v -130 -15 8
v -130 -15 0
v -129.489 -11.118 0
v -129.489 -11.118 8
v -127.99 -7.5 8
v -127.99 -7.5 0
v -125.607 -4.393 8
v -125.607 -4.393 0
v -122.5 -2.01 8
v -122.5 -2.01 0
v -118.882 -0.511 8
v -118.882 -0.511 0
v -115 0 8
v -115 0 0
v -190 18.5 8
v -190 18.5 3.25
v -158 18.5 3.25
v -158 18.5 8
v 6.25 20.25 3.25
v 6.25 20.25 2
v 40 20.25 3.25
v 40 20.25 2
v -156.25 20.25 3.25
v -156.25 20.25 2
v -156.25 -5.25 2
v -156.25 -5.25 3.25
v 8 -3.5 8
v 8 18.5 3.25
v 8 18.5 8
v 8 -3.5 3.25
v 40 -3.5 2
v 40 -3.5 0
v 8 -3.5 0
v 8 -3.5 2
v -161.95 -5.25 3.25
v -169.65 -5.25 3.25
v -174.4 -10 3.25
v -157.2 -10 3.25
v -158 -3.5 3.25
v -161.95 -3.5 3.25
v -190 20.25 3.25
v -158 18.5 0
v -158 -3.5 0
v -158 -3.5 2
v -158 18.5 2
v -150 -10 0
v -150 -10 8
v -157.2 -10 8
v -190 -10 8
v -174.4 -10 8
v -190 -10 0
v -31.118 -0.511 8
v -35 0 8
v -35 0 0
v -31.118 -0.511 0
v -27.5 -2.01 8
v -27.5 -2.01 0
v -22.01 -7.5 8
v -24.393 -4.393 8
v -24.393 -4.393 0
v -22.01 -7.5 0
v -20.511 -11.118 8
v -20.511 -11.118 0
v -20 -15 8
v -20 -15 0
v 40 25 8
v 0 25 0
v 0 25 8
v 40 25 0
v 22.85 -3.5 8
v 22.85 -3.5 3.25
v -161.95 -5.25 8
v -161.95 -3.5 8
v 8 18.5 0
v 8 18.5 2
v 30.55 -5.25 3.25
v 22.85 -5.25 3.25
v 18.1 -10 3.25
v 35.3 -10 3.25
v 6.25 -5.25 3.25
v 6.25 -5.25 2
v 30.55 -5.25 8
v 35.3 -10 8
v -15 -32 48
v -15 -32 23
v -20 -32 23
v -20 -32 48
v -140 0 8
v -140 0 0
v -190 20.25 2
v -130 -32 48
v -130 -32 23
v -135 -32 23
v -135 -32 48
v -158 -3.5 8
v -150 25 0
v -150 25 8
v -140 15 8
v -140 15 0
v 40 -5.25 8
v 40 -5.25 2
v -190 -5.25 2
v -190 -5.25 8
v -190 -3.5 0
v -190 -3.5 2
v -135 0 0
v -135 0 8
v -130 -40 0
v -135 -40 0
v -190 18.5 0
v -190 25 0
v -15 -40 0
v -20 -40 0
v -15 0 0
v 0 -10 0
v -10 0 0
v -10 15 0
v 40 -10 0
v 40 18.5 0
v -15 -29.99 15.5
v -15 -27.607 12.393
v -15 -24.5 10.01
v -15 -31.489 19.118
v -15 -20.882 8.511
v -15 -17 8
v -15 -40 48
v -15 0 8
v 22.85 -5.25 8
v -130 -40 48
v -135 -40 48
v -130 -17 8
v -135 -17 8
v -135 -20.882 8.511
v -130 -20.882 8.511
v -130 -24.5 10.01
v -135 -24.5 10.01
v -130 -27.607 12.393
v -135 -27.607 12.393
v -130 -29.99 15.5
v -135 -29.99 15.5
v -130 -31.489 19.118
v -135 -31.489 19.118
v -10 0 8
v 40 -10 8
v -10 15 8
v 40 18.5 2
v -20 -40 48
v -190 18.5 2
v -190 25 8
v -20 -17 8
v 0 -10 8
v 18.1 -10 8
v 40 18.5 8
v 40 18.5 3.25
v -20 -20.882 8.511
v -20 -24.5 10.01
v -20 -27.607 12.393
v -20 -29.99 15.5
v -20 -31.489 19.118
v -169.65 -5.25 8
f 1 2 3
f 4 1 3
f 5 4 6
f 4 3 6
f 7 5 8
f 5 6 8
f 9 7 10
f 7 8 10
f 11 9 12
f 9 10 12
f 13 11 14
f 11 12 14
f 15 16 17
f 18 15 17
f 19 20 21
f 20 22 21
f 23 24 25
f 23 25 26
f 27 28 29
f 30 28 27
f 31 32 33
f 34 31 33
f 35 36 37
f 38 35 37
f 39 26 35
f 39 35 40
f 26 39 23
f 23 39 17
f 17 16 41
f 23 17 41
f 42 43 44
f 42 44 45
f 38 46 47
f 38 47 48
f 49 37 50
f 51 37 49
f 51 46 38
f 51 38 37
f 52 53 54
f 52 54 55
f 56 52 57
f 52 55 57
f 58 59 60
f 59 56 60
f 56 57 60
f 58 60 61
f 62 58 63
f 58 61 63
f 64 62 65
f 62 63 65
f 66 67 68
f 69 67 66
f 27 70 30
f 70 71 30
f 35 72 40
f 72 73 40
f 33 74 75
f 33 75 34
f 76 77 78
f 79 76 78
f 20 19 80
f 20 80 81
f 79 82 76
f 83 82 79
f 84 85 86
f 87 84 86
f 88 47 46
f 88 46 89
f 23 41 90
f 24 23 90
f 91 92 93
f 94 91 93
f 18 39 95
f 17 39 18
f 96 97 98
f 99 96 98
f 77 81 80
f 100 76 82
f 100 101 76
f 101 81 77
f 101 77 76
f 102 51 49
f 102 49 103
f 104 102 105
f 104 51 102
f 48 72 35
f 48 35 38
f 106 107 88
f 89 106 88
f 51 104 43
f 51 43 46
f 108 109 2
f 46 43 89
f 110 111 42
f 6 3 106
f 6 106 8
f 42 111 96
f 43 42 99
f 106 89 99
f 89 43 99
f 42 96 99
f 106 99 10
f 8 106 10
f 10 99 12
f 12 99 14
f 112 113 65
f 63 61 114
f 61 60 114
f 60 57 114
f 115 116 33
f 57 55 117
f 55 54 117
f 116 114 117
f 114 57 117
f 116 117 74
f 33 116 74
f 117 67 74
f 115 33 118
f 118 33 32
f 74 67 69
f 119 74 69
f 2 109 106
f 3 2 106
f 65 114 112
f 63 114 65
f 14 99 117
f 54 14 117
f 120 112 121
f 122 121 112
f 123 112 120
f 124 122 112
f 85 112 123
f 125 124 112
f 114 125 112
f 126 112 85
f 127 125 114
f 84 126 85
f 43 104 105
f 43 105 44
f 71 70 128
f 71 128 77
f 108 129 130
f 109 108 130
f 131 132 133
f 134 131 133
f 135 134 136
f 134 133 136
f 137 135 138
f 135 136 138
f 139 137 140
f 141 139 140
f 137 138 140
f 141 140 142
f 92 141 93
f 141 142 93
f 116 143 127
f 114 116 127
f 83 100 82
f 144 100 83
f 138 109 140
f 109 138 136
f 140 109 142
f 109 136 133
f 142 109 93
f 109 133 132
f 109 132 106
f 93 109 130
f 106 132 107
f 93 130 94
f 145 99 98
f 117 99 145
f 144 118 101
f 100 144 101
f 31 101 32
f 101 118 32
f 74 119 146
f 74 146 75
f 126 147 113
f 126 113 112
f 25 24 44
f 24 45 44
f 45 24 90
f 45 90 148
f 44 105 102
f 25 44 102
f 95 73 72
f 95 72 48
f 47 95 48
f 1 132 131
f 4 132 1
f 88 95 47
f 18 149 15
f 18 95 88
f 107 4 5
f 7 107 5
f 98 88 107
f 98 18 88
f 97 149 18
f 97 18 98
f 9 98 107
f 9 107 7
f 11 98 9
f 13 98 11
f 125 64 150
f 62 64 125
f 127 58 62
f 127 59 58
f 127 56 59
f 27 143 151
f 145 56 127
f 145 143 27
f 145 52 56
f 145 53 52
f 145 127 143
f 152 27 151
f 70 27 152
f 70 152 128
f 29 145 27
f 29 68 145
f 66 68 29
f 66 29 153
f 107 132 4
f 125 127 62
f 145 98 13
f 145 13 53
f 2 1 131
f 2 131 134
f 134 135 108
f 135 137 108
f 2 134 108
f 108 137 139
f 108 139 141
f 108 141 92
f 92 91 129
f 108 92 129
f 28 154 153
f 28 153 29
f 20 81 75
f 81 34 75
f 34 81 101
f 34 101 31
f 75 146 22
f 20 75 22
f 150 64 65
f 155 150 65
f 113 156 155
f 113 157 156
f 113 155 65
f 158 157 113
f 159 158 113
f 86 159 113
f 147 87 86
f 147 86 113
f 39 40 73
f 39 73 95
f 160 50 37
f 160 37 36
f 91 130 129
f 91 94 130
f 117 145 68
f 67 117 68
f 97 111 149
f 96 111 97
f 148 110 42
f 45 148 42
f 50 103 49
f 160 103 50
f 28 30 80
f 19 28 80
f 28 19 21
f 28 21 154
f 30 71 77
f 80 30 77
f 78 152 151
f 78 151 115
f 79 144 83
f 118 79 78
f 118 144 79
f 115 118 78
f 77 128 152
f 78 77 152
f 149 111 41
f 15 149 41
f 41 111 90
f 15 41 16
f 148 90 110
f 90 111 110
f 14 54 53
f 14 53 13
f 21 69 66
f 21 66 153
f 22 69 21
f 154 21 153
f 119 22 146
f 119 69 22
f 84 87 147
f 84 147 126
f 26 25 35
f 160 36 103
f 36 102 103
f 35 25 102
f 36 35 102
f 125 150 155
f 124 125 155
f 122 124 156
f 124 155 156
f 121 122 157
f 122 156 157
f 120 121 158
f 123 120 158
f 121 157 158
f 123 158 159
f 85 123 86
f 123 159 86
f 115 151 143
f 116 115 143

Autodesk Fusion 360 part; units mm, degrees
sketch "Sketch1" plane through (0, 0, 0) normal (0, 0, 1) x (1, 0, 0)
  line L0 (0, 0) -> (-150, 0)
  line L1 (-150, 0) -> (-150, 15)
  line L2 (-150, 15) -> (0, 15)
  line L3 (0, 15) -> (0, 0)
  line L4 (-150, -10) -> (-158, -10)
  line L5 (-158, -10) -> (-158, 25)
  line L6 (-158, 25) -> (-150, 25)
  line L7 (-150, 25) -> (-150, -10)
  line L8 (-158, -5) -> (-188, -5)
  line L9 (-188, -5) -> (-188, 20)
  line L10 (-188, 20) -> (-158, 20)
  line L11 (-158, 20) -> (-158, -5)
  line L12 (-158, -10) -> (-190, -10)
  line L13 (-190, -10) -> (-190, -3.5)
  line L14 (-190, -3.5) -> (-158, -3.5)
  line L15 (-158, -3.5) -> (-158, -10)
  line L16 (-158, 25) -> (-190, 25)
  line L17 (-190, 25) -> (-190, 18.5)
  line L18 (-190, 18.5) -> (-158, 18.5)
  line L19 (-158, 18.5) -> (-158, 25)
  line L20 (0, 25) -> (8, 25)
  line L21 (8, 25) -> (8, -10)
  line L22 (8, -10) -> (0, -10)
  line L23 (0, -10) -> (0, 25)
  line L24 (8, 25) -> (40, 25)
  line L25 (40, 25) -> (40, 18.5)
  line L26 (40, 18.5) -> (8, 18.5)
  line L27 (8, 18.5) -> (8, 25)
  line L28 (8, -10) -> (40, -10)
  line L29 (40, -10) -> (40, -3.5)
  line L30 (40, -3.5) -> (8, -3.5)
  line L31 (8, -3.5) -> (8, -10)
  dimension "d1" = 150
  dimension "d2" = 15
  dimension "d3" = 8
  dimension "d4" = 35
  dimension "d5" = 10
  dimension "d6" = 30
  dimension "d7" = 25
  dimension "d8" = 5
  dimension "d9" = 6.5
  dimension "d10" = 32
  dimension "d11" = 32
  dimension "d12" = 6.5
  dimension "d13" = 8
  dimension "d14" = 35
  dimension "d15" = 10
  dimension "d16" = 32
  dimension "d17" = 6.5
  dimension "d18" = 32
  dimension "d19" = 6.5
extrude "Extrude1" add sketch "Sketch1" along normal blind 8 contours L0 L1 L2 L3 L7 L23 | L3 L20 L21 L22 L23 L27 L31 | L1 L4 L5 L6 L7 L11 L15 L19 | L21 L28 L29 L30 L31 | L5 L8 L9 L12 L13 L14 L15 | L21 L24 L25 L26 L27 | L5 L9 L10 L16 L17 L18 L19 | L5 L8 L9 L11 L14 L15 | L5 L9 L10 L11 L18 L19
sketch "Sketch2" plane through (-190, 0, 0) normal (-1, 0, 0) x (0, 0, 1)
  line L0 (0, -3.5) -> (0, -10)
  line L1 (0, -10) -> (8, -10)
  line L2 (8, -10) -> (8, -3.5)
  line L3 (8, -3.5) -> (0, -3.5)
  line L4 (2, -3.5) -> (3.25, -3.5)
  line L5 (3.25, -3.5) -> (3.25, -5.25)
  line L6 (3.25, -5.25) -> (2, -5.25)
  line L7 (2, -5.25) -> (2, -3.5)
  line L8 (2, 18.5) -> (3.25, 18.5)
  line L9 (3.25, 18.5) -> (3.25, 20.25)
  line L10 (3.25, 20.25) -> (2, 20.25)
  line L11 (2, 20.25) -> (2, 18.5)
  dimension "d22" = 1.25
  dimension "d23" = 1.75
  dimension "d24" = 1.25
  dimension "d25" = 1.75
  dimension "d26" = 22
  dimension "d27" = 2
extrude "Extrude2" cut sketch "Sketch2" against normal blind 32 contours L3 L4 L5 L6 L7 | L8 L9 L10 L11
sketch "Sketch3" plane through (-158, 0, 0) normal (-1, 0, 0) x (0, 0, 1)
  line L0 (0, 18.5) -> (0, -3.5)
  line L1 (0, -3.5) -> (2, -3.5)
  line L2 (2, -3.5) -> (2, -5.25)
  line L3 (2, -5.25) -> (3.25, -5.25)
  line L4 (3.25, -5.25) -> (3.25, -3.5)
  line L5 (3.25, -3.5) -> (8, -3.5)
  line L6 (8, -3.5) -> (8, 18.5)
  line L7 (8, 18.5) -> (3.25, 18.5)
  line L8 (3.25, 18.5) -> (3.25, 20.25)
  line L9 (3.25, 20.25) -> (2, 20.25)
  line L10 (2, 20.25) -> (2, 18.5)
  line L11 (2, 18.5) -> (0, 18.5)
  line L12 (2, -5.25) -> (3.25, -5.25)
  line L13 (3.25, -5.25) -> (3.25, 20.25)
  line L14 (3.25, 20.25) -> (2, 20.25)
  line L15 (2, 20.25) -> (2, -5.25)
extrude "Extrude3" cut sketch "Sketch3" against normal blind 1.5 contours L2 L3 L4 L8 L9 L10 L12 L13 L14 L15
sketch "Sketch4" plane through (40, 0, 0) normal (1, 0, 0) x (0, 0, -1)
  line L0 (0, -10) -> (0, -3.5)
  line L1 (0, -3.5) -> (-8, -3.5)
  line L2 (-8, -3.5) -> (-8, -10)
  line L3 (-8, -10) -> (0, -10)
  line L4 (-2, -3.5) -> (-3.25, -3.5)
  line L5 (-3.25, -3.5) -> (-3.25, -5.25)
  line L6 (-3.25, -5.25) -> (-2, -5.25)
  line L7 (-2, -5.25) -> (-2, -3.5)
  line L8 (-3.25, 18.5) -> (-2, 18.5)
  line L9 (-2, 18.5) -> (-2, 20.25)
  line L10 (-2, 20.25) -> (-3.25, 20.25)
  line L11 (-3.25, 20.25) -> (-3.25, 18.5)
  line L12 (-2, -5.25) -> (-2, 20.25)
  dimension "d32" = 1.25
  dimension "d33" = 1.75
  dimension "d34" = 2
  dimension "d35" = 1.25
  dimension "d36" = 1.75
  dimension "d37" = 22
extrude "Extrude4" cut sketch "Sketch4" against normal blind 32 contours L8 L9 L10 L11 L12 | L1 L4 L5 L6 L7 L12
sketch "Sketch5" plane through (8, 0, 0) normal (1, 0, 0) x (0, 0, -1)
  line L0 (0, -3.5) -> (0, 18.5)
  line L1 (0, 18.5) -> (-2, 18.5)
  line L2 (-2, 18.5) -> (-2, 20.25)
  line L3 (-2, 20.25) -> (-3.25, 20.25)
  line L4 (-3.25, 20.25) -> (-3.25, 18.5)
  line L5 (-3.25, 18.5) -> (-8, 18.5)
  line L6 (-8, 18.5) -> (-8, -3.5)
  line L7 (-8, -3.5) -> (-3.25, -3.5)
  line L8 (-3.25, -3.5) -> (-3.25, -5.25)
  line L9 (-3.25, -5.25) -> (-2, -5.25)
  line L10 (-2, -5.25) -> (-2, -3.5)
  line L11 (-2, -3.5) -> (0, -3.5)
  line L12 (-3.25, 20.25) -> (-2, 20.25)
  line L13 (-2, 20.25) -> (-2, -5.25)
  line L14 (-2, -5.25) -> (-3.25, -5.25)
  line L15 (-3.25, -5.25) -> (-3.25, 20.25)
extrude "Extrude5" cut sketch "Sketch5" against normal blind 1.75 contours L2 L3 L4 L8 L9 L10 L12 L13 L14 L15
extrude "Extrude6" cut 1 faces at (-156.5, 11.75, 2.4167) along direction (1, 0, 0) blind 0.25
sketch "Sketch6" plane through (-190, 0, 0) normal (-1, 0, 0) x (0, 0, 1)
  line L0 (2, -5.25) -> (2, -3.5)
  line L1 (2, -3.5) -> (0, -3.5)
  line L2 (0, -3.5) -> (0, -10)
  line L3 (0, -10) -> (8, -10)
  line L4 (8, -10) -> (8, -3.5)
  line L5 (8, -3.5) -> (3.25, -3.5)
  line L6 (3.25, -3.5) -> (3.25, -5.25)
  line L7 (3.25, -5.25) -> (2, -5.25)
  line L8 (3.25, -5.25) -> (8, -5.25)
  line L9 (8, -5.25) -> (8, -3.5)
  line L10 (8, -3.5) -> (3.25, -3.5)
  line L11 (3.25, -3.5) -> (3.25, -5.25)
extrude "Extrude7" cut sketch "Sketch6" against normal blind 27.85 contours L4 L5 L6 L8 L9 L10 L11
sketch "Sketch7" plane through (40, 0, 0) normal (1, 0, 0) x (0, 0, -1)
  line L0 (-2, -3.5) -> (-2, -5.25)
  line L1 (-2, -5.25) -> (-3.25, -5.25)
  line L2 (-3.25, -5.25) -> (-3.25, -3.5)
  line L3 (-3.25, -3.5) -> (-8, -3.5)
  line L4 (-8, -3.5) -> (-8, -10)
  line L5 (-8, -10) -> (0, -10)
  line L6 (0, -10) -> (0, -3.5)
  line L7 (0, -3.5) -> (-2, -3.5)
  line L8 (-3.25, -5.25) -> (-8, -5.25)
  line L9 (-8, -5.25) -> (-8, -3.5)
  line L10 (-8, -3.5) -> (-3.25, -3.5)
  line L11 (-3.25, -3.5) -> (-3.25, -5.25)
extrude "Extrude8" cut sketch "Sketch7" against normal blind 13.2 contours L2 L3 L4 L8 L9 L10 L11
extrude "Extrude9" cut 1 faces at (26.8, -4.6667, 4.8333) along direction (-1, 0, 0) blind 0.1
extrude "Extrude10" cut 1 faces at (26.7, -4.6667, 4.8333) along direction (-1, 0, 0) blind 0.1
extrude "Extrude11" cut 1 faces at (-162.15, -4.0833, 4.8333) along direction (1, 0, 0) blind 0.1
sketch "Sketch8" plane through (0, -5.25, 0) normal (0, 1, 0) x (-1, 0, 0)
  line L0 (-40, 8) -> (-40, 2)
  line L1 (-40, 2) -> (-6.25, 2)
  line L2 (-6.25, 2) -> (-6.25, 3.25)
  line L3 (-6.25, 3.25) -> (-26.6, 3.25)
  line L4 (-26.6, 3.25) -> (-26.6, 8)
  line L5 (-26.6, 8) -> (-40, 8)
  line L6 (-26.6, 3.25) -> (-34.1, 3.25)
  line L7 (-34.1, 3.25) -> (-34.1, 8)
  line L8 (-34.1, 8) -> (-26.6, 8)
  line L9 (-26.6, 8) -> (-26.6, 3.25)
  dimension "d54" = 7.5
extrude "Extrude12" cut sketch "Sketch8" against normal blind 9 contours L4 L5 L6 L7 L8 L9
sketch "Sketch9" plane through (0, -5.25, 0) normal (0, 1, 0) x (-1, 0, 0)
  line L0 (190, 2) -> (190, 8)
  line L1 (190, 8) -> (162.05, 8)
  line L2 (162.05, 8) -> (162.05, 3.25)
  line L3 (162.05, 3.25) -> (156.25, 3.25)
  line L4 (156.25, 3.25) -> (156.25, 2)
  line L5 (156.25, 2) -> (190, 2)
  line L6 (162.05, 3.25) -> (169.55, 3.25)
  line L7 (169.55, 3.25) -> (169.55, 8)
  line L8 (169.55, 8) -> (162.05, 8)
  line L9 (162.05, 8) -> (162.05, 3.25)
  dimension "d57" = 7.5
extrude "Extrude13" cut sketch "Sketch9" against normal blind 6 contours L1 L2 L6 L7 L8 L9
extrude "Extrude18" cut 1 faces at (26.6, -6.25, 6.4167) along direction (-1, 0, 0) blind 2
extrude "Extrude19" add 1 faces at (34.1, -6.8333, 4.8333) along direction (-1, 0, 0) blind 2
extrude "Extrude20" cut 1 faces at (24.6, -6.25, 6.4167) along direction (-1, 0, 0) blind 1.75
extrude "Extrude21" add 1 faces at (32.1, -6.8333, 4.8333) along direction (-1, 0, 0) blind 1.75
extrude "Extrude22" cut 1 faces at (30.35, -6.8333, 4.8333) along direction (1, 0, 0) blind 0.2
extrude "Extrude23" cut 1 faces at (-169.55, -6.8333, 4.8333) along direction (-1, 0, 0) blind 0.1
extrude "Extrude24" cut 1 faces at (-162.05, -6.25, 6.4167) along direction (1, 0, 0) blind 0.1
sketch "Sketch14" plane through (0, 0, 8) normal (0, 0, 1) x (1, 0, 0)
  line L0 (-161.95, -3.5) -> (-161.95, -10)
  line L1 (-161.95, -10) -> (-150, -10)
  line L2 (-150, -10) -> (-150, 0)
  line L3 (-150, 0) -> (0, 0)
  line L4 (0, 0) -> (0, -10)
  line L5 (0, -10) -> (22.85, -10)
  line L6 (22.85, -10) -> (22.85, -3.5)
  line L7 (22.85, -3.5) -> (8, -3.5)
  line L8 (8, -3.5) -> (8, 18.5)
  line L9 (8, 18.5) -> (40, 18.5)
  line L10 (40, 18.5) -> (40, 25)
  line L11 (40, 25) -> (0, 25)
  line L12 (0, 25) -> (0, 15)
  line L13 (0, 15) -> (-150, 15)
  line L14 (-150, 15) -> (-150, 25)
  line L15 (-150, 25) -> (-190, 25)
  line L16 (-190, 25) -> (-190, 18.5)
  line L17 (-190, 18.5) -> (-158, 18.5)
  line L18 (-158, 18.5) -> (-158, -3.5)
  line L19 (-158, -3.5) -> (-161.95, -3.5)
  line L20 (22.85, -5.25) -> (22.85, -10)
  line L21 (22.85, -10) -> (18.1, -10)
  line L22 (22.85, -5.25) -> (18.1, -10)
  dimension "d89" = 4.75
  dimension "d90" = 4.75
extrude "Extrude25" cut sketch "Sketch14" against normal blind 4.75 contours L5 L6 L20 L21 L22
sketch "Sketch15" plane through (0, 0, 8) normal (0, 0, 1) x (1, 0, 0)
  line L0 (30.55, -5.25) -> (30.55, -10)
  line L1 (30.55, -10) -> (40, -10)
  line L2 (40, -10) -> (40, -5.25)
  line L3 (40, -5.25) -> (30.55, -5.25)
  line L4 (30.55, -5.25) -> (30.55, -10)
  line L5 (30.55, -10) -> (35.3, -10)
  line L6 (30.55, -5.25) -> (35.3, -10)
  dimension "d93" = 4.75
extrude "Extrude26" cut sketch "Sketch15" against normal blind 4.75 contours L0 L1 L4 L5 L6
sketch "Sketch16" plane through (0, 0, 8) normal (0, 0, 1) x (1, 0, 0)
  line L0 (-169.65, -10) -> (-169.65, -5.25)
  line L1 (-169.65, -5.25) -> (-190, -5.25)
  line L2 (-190, -5.25) -> (-190, -10)
  line L3 (-190, -10) -> (-169.65, -10)
  line L4 (-169.65, -5.25) -> (-169.65, -10)
  line L5 (-169.65, -10) -> (-174.4, -10)
  line L6 (-174.4, -10) -> (-169.65, -5.25)
  dimension "d60" = 4.75
  dimension "d61" = 4.75
  dimension "d96" = 4.75
extrude "Extrude27" cut sketch "Sketch16" against normal blind 4.75 contours L0 L3 L4 L5 L6
sketch "Sketch17" plane through (0, 0, 8) normal (0, 0, 1) x (1, 0, 0)
  line L0 (18.1, -10) -> (22.85, -5.25)
  line L1 (22.85, -5.25) -> (22.85, -3.5)
  line L2 (22.85, -3.5) -> (8, -3.5)
  line L3 (8, -3.5) -> (8, 18.5)
  line L4 (8, 18.5) -> (40, 18.5)
  line L5 (40, 18.5) -> (40, 25)
  line L6 (40, 25) -> (0, 25)
  line L7 (0, 25) -> (0, 15)
  line L8 (0, 15) -> (-150, 15)
  line L9 (-150, 15) -> (-150, 25)
  line L10 (-150, 25) -> (-190, 25)
  line L11 (-190, 25) -> (-190, 18.5)
  line L12 (-190, 18.5) -> (-158, 18.5)
  line L13 (-158, 18.5) -> (-158, -3.5)
  line L14 (-158, -3.5) -> (-161.95, -3.5)
  line L15 (-161.95, -3.5) -> (-161.95, -10)
  line L16 (-161.95, -10) -> (-150, -10)
  line L17 (-150, -10) -> (-150, 0)
  line L18 (-150, 0) -> (0, 0)
  line L19 (0, 0) -> (0, -10)
  line L20 (0, -10) -> (18.1, -10)
  line L21 (-161.95, -10) -> (-161.95, -5.25)
  line L22 (-161.95, -10) -> (-157.2, -10)
  line L23 (-161.95, -5.25) -> (-157.2, -10)
  dimension "d99" = 4.75
  dimension "d100" = 4.75
extrude "Extrude28" cut sketch "Sketch17" against normal blind 4.75 contours L15 L16 L21 L22 L23
sketch "Sketch18" plane through (0, 0, 8) normal (0, 0, 1) x (1, 0, 0)
  line L0 (-161.95, -5.25) -> (-157.2, -10)
  line L1 (-157.2, -10) -> (-150, -10)
  line L2 (-150, -10) -> (-150, 0)
  line L3 (-150, 0) -> (0, 0)
  line L4 (0, 0) -> (0, -10)
  line L5 (0, -10) -> (18.1, -10)
  line L6 (18.1, -10) -> (22.85, -5.25)
  line L7 (22.85, -5.25) -> (22.85, -3.5)
  line L8 (22.85, -3.5) -> (8, -3.5)
  line L9 (8, -3.5) -> (8, 18.5)
  line L10 (8, 18.5) -> (40, 18.5)
  line L11 (40, 18.5) -> (40, 25)
  line L12 (40, 25) -> (0, 25)
  line L13 (0, 25) -> (0, 15)
  line L14 (0, 15) -> (-150, 15)
  line L15 (-150, 15) -> (-150, 25)
  line L16 (-150, 25) -> (-190, 25)
  line L17 (-190, 25) -> (-190, 18.5)
  line L18 (-190, 18.5) -> (-158, 18.5)
  line L19 (-158, 18.5) -> (-158, -3.5)
  line L20 (-158, -3.5) -> (-161.95, -3.5)
  line L21 (-161.95, -3.5) -> (-161.95, -5.25)
  line L22 (0, 25) -> (0, 15)
  line L23 (0, 15) -> (-10, 15)
  line L24 (-10, 15) -> (0, 25)
  line L25 (0, 0) -> (-10, 0)
  line L26 (0, 0) -> (0, -10)
  line L27 (0, -10) -> (-10, 0)
  line L28 (-150, 25) -> (-150, 15)
  line L29 (-150, 15) -> (-140, 15)
  line L30 (-150, 25) -> (-140, 15)
  line L31 (-150, 0) -> (-150, -10)
  line L32 (-150, 0) -> (-140, 0)
  line L33 (-150, -10) -> (-140, 0)
  dimension "d103" = 10
  dimension "d104" = 10
  dimension "d105" = 10
  dimension "d106" = 10
extrude "Extrude29" add sketch "Sketch18" against normal blind 8 contours L2 L3 L31 L32 L33 | L3 L4 L25 L26 L27 | L14 L15 L28 L29 L30 | L13 L14 L22 L23 L24
sketch "Sketch19" plane through (0, 0, 8) normal (0, 0, 1) x (1, 0, 0)
  line L0 (-161.95, -5.25) -> (-157.2, -10)
  line L1 (-157.2, -10) -> (-150, -10)
  line L2 (-150, -10) -> (-140, 0)
  line L3 (-140, 0) -> (-10, 0)
  line L4 (-10, 0) -> (0, -10)
  line L5 (0, -10) -> (18.1, -10)
  line L6 (18.1, -10) -> (22.85, -5.25)
  line L7 (22.85, -5.25) -> (22.85, -3.5)
  line L8 (22.85, -3.5) -> (8, -3.5)
  line L9 (8, -3.5) -> (8, 18.5)
  line L10 (8, 18.5) -> (40, 18.5)
  line L11 (40, 18.5) -> (40, 25)
  line L12 (40, 25) -> (0, 25)
  line L13 (0, 25) -> (-10, 15)
  line L14 (-10, 15) -> (-140, 15)
  line L15 (-140, 15) -> (-150, 25)
  line L16 (-150, 25) -> (-190, 25)
  line L17 (-190, 25) -> (-190, 18.5)
  line L18 (-190, 18.5) -> (-158, 18.5)
  line L19 (-158, 18.5) -> (-158, -3.5)
  line L20 (-158, -3.5) -> (-161.95, -3.5)
  line L21 (-161.95, -3.5) -> (-161.95, -5.25)
  line L22 (-135, 0) -> (-130, 0)
  line L23 (-130, 0) -> (-130, -40)
  line L24 (-130, -40) -> (-135, -40)
  line L25 (-135, -40) -> (-135, 0)
  line L26 (-15, 0) -> (-20, 0)
  line L27 (-20, 0) -> (-20, -40)
  line L28 (-20, -40) -> (-15, -40)
  line L29 (-15, -40) -> (-15, 0)
  dimension "d109" = 40
  dimension "d110" = 40
extrude "Extrude30" add sketch "Sketch19" against normal blind 8 contours L3 L22 L23 L24 L25 | L3 L26 L27 L28 L29
sketch "Sketch20" plane through (0, 0, 8) normal (0, 0, 1) x (1, 0, 0)
  line L0 (-161.95, -5.25) -> (-157.2, -10)
  line L1 (-157.2, -10) -> (-150, -10)
  line L2 (-150, -10) -> (-140, 0)
  line L3 (-140, 0) -> (-135, 0)
  line L4 (-135, 0) -> (-135, -40)
  line L5 (-135, -40) -> (-130, -40)
  line L6 (-130, -40) -> (-130, 0)
  line L7 (-130, 0) -> (-20, 0)
  line L8 (-20, 0) -> (-20, -40)
  line L9 (-20, -40) -> (-15, -40)
  line L10 (-15, -40) -> (-15, 0)
  line L11 (-15, 0) -> (-10, 0)
  line L12 (-10, 0) -> (0, -10)
  line L13 (0, -10) -> (18.1, -10)
  line L14 (18.1, -10) -> (22.85, -5.25)
  line L15 (22.85, -5.25) -> (22.85, -3.5)
  line L16 (22.85, -3.5) -> (8, -3.5)
  line L17 (8, -3.5) -> (8, 18.5)
  line L18 (8, 18.5) -> (40, 18.5)
  line L19 (40, 18.5) -> (40, 25)
  line L20 (40, 25) -> (0, 25)
  line L21 (0, 25) -> (-10, 15)
  line L22 (-10, 15) -> (-140, 15)
  line L23 (-140, 15) -> (-150, 25)
  line L24 (-150, 25) -> (-190, 25)
  line L25 (-190, 25) -> (-190, 18.5)
  line L26 (-190, 18.5) -> (-158, 18.5)
  line L27 (-158, 18.5) -> (-158, -3.5)
  line L28 (-158, -3.5) -> (-161.95, -3.5)
  line L29 (-161.95, -3.5) -> (-161.95, -5.25)
  line L30 (-135, -40) -> (-130, -40)
  line L31 (-130, -40) -> (-130, -35)
  line L32 (-130, -35) -> (-135, -35)
  line L33 (-135, -35) -> (-135, -40)
  line L34 (-20, -40) -> (-15, -40)
  line L35 (-15, -40) -> (-15, -35)
  line L36 (-15, -35) -> (-20, -35)
  line L37 (-20, -35) -> (-20, -40)
extrude "Extrude31" add sketch "Sketch20" along normal blind 40 contours L4 L5 L6 L30 L31 L32 L33 | L8 L9 L10 L34 L35 L36 L37
extrude "Extrude32" add 2 faces at (-16.6667, -35, 34.6667) (-131.6667, -35, 21.3333) along direction (0, 1, 0) blind 3
fillet "Fillet1" radius 15 2 edges at (-132.5, -32, 8) (-17.5, -32, 8)
fillet "Fillet2" radius 15 2 edges at (-20, 0, 4) (-130, 0, 4)
